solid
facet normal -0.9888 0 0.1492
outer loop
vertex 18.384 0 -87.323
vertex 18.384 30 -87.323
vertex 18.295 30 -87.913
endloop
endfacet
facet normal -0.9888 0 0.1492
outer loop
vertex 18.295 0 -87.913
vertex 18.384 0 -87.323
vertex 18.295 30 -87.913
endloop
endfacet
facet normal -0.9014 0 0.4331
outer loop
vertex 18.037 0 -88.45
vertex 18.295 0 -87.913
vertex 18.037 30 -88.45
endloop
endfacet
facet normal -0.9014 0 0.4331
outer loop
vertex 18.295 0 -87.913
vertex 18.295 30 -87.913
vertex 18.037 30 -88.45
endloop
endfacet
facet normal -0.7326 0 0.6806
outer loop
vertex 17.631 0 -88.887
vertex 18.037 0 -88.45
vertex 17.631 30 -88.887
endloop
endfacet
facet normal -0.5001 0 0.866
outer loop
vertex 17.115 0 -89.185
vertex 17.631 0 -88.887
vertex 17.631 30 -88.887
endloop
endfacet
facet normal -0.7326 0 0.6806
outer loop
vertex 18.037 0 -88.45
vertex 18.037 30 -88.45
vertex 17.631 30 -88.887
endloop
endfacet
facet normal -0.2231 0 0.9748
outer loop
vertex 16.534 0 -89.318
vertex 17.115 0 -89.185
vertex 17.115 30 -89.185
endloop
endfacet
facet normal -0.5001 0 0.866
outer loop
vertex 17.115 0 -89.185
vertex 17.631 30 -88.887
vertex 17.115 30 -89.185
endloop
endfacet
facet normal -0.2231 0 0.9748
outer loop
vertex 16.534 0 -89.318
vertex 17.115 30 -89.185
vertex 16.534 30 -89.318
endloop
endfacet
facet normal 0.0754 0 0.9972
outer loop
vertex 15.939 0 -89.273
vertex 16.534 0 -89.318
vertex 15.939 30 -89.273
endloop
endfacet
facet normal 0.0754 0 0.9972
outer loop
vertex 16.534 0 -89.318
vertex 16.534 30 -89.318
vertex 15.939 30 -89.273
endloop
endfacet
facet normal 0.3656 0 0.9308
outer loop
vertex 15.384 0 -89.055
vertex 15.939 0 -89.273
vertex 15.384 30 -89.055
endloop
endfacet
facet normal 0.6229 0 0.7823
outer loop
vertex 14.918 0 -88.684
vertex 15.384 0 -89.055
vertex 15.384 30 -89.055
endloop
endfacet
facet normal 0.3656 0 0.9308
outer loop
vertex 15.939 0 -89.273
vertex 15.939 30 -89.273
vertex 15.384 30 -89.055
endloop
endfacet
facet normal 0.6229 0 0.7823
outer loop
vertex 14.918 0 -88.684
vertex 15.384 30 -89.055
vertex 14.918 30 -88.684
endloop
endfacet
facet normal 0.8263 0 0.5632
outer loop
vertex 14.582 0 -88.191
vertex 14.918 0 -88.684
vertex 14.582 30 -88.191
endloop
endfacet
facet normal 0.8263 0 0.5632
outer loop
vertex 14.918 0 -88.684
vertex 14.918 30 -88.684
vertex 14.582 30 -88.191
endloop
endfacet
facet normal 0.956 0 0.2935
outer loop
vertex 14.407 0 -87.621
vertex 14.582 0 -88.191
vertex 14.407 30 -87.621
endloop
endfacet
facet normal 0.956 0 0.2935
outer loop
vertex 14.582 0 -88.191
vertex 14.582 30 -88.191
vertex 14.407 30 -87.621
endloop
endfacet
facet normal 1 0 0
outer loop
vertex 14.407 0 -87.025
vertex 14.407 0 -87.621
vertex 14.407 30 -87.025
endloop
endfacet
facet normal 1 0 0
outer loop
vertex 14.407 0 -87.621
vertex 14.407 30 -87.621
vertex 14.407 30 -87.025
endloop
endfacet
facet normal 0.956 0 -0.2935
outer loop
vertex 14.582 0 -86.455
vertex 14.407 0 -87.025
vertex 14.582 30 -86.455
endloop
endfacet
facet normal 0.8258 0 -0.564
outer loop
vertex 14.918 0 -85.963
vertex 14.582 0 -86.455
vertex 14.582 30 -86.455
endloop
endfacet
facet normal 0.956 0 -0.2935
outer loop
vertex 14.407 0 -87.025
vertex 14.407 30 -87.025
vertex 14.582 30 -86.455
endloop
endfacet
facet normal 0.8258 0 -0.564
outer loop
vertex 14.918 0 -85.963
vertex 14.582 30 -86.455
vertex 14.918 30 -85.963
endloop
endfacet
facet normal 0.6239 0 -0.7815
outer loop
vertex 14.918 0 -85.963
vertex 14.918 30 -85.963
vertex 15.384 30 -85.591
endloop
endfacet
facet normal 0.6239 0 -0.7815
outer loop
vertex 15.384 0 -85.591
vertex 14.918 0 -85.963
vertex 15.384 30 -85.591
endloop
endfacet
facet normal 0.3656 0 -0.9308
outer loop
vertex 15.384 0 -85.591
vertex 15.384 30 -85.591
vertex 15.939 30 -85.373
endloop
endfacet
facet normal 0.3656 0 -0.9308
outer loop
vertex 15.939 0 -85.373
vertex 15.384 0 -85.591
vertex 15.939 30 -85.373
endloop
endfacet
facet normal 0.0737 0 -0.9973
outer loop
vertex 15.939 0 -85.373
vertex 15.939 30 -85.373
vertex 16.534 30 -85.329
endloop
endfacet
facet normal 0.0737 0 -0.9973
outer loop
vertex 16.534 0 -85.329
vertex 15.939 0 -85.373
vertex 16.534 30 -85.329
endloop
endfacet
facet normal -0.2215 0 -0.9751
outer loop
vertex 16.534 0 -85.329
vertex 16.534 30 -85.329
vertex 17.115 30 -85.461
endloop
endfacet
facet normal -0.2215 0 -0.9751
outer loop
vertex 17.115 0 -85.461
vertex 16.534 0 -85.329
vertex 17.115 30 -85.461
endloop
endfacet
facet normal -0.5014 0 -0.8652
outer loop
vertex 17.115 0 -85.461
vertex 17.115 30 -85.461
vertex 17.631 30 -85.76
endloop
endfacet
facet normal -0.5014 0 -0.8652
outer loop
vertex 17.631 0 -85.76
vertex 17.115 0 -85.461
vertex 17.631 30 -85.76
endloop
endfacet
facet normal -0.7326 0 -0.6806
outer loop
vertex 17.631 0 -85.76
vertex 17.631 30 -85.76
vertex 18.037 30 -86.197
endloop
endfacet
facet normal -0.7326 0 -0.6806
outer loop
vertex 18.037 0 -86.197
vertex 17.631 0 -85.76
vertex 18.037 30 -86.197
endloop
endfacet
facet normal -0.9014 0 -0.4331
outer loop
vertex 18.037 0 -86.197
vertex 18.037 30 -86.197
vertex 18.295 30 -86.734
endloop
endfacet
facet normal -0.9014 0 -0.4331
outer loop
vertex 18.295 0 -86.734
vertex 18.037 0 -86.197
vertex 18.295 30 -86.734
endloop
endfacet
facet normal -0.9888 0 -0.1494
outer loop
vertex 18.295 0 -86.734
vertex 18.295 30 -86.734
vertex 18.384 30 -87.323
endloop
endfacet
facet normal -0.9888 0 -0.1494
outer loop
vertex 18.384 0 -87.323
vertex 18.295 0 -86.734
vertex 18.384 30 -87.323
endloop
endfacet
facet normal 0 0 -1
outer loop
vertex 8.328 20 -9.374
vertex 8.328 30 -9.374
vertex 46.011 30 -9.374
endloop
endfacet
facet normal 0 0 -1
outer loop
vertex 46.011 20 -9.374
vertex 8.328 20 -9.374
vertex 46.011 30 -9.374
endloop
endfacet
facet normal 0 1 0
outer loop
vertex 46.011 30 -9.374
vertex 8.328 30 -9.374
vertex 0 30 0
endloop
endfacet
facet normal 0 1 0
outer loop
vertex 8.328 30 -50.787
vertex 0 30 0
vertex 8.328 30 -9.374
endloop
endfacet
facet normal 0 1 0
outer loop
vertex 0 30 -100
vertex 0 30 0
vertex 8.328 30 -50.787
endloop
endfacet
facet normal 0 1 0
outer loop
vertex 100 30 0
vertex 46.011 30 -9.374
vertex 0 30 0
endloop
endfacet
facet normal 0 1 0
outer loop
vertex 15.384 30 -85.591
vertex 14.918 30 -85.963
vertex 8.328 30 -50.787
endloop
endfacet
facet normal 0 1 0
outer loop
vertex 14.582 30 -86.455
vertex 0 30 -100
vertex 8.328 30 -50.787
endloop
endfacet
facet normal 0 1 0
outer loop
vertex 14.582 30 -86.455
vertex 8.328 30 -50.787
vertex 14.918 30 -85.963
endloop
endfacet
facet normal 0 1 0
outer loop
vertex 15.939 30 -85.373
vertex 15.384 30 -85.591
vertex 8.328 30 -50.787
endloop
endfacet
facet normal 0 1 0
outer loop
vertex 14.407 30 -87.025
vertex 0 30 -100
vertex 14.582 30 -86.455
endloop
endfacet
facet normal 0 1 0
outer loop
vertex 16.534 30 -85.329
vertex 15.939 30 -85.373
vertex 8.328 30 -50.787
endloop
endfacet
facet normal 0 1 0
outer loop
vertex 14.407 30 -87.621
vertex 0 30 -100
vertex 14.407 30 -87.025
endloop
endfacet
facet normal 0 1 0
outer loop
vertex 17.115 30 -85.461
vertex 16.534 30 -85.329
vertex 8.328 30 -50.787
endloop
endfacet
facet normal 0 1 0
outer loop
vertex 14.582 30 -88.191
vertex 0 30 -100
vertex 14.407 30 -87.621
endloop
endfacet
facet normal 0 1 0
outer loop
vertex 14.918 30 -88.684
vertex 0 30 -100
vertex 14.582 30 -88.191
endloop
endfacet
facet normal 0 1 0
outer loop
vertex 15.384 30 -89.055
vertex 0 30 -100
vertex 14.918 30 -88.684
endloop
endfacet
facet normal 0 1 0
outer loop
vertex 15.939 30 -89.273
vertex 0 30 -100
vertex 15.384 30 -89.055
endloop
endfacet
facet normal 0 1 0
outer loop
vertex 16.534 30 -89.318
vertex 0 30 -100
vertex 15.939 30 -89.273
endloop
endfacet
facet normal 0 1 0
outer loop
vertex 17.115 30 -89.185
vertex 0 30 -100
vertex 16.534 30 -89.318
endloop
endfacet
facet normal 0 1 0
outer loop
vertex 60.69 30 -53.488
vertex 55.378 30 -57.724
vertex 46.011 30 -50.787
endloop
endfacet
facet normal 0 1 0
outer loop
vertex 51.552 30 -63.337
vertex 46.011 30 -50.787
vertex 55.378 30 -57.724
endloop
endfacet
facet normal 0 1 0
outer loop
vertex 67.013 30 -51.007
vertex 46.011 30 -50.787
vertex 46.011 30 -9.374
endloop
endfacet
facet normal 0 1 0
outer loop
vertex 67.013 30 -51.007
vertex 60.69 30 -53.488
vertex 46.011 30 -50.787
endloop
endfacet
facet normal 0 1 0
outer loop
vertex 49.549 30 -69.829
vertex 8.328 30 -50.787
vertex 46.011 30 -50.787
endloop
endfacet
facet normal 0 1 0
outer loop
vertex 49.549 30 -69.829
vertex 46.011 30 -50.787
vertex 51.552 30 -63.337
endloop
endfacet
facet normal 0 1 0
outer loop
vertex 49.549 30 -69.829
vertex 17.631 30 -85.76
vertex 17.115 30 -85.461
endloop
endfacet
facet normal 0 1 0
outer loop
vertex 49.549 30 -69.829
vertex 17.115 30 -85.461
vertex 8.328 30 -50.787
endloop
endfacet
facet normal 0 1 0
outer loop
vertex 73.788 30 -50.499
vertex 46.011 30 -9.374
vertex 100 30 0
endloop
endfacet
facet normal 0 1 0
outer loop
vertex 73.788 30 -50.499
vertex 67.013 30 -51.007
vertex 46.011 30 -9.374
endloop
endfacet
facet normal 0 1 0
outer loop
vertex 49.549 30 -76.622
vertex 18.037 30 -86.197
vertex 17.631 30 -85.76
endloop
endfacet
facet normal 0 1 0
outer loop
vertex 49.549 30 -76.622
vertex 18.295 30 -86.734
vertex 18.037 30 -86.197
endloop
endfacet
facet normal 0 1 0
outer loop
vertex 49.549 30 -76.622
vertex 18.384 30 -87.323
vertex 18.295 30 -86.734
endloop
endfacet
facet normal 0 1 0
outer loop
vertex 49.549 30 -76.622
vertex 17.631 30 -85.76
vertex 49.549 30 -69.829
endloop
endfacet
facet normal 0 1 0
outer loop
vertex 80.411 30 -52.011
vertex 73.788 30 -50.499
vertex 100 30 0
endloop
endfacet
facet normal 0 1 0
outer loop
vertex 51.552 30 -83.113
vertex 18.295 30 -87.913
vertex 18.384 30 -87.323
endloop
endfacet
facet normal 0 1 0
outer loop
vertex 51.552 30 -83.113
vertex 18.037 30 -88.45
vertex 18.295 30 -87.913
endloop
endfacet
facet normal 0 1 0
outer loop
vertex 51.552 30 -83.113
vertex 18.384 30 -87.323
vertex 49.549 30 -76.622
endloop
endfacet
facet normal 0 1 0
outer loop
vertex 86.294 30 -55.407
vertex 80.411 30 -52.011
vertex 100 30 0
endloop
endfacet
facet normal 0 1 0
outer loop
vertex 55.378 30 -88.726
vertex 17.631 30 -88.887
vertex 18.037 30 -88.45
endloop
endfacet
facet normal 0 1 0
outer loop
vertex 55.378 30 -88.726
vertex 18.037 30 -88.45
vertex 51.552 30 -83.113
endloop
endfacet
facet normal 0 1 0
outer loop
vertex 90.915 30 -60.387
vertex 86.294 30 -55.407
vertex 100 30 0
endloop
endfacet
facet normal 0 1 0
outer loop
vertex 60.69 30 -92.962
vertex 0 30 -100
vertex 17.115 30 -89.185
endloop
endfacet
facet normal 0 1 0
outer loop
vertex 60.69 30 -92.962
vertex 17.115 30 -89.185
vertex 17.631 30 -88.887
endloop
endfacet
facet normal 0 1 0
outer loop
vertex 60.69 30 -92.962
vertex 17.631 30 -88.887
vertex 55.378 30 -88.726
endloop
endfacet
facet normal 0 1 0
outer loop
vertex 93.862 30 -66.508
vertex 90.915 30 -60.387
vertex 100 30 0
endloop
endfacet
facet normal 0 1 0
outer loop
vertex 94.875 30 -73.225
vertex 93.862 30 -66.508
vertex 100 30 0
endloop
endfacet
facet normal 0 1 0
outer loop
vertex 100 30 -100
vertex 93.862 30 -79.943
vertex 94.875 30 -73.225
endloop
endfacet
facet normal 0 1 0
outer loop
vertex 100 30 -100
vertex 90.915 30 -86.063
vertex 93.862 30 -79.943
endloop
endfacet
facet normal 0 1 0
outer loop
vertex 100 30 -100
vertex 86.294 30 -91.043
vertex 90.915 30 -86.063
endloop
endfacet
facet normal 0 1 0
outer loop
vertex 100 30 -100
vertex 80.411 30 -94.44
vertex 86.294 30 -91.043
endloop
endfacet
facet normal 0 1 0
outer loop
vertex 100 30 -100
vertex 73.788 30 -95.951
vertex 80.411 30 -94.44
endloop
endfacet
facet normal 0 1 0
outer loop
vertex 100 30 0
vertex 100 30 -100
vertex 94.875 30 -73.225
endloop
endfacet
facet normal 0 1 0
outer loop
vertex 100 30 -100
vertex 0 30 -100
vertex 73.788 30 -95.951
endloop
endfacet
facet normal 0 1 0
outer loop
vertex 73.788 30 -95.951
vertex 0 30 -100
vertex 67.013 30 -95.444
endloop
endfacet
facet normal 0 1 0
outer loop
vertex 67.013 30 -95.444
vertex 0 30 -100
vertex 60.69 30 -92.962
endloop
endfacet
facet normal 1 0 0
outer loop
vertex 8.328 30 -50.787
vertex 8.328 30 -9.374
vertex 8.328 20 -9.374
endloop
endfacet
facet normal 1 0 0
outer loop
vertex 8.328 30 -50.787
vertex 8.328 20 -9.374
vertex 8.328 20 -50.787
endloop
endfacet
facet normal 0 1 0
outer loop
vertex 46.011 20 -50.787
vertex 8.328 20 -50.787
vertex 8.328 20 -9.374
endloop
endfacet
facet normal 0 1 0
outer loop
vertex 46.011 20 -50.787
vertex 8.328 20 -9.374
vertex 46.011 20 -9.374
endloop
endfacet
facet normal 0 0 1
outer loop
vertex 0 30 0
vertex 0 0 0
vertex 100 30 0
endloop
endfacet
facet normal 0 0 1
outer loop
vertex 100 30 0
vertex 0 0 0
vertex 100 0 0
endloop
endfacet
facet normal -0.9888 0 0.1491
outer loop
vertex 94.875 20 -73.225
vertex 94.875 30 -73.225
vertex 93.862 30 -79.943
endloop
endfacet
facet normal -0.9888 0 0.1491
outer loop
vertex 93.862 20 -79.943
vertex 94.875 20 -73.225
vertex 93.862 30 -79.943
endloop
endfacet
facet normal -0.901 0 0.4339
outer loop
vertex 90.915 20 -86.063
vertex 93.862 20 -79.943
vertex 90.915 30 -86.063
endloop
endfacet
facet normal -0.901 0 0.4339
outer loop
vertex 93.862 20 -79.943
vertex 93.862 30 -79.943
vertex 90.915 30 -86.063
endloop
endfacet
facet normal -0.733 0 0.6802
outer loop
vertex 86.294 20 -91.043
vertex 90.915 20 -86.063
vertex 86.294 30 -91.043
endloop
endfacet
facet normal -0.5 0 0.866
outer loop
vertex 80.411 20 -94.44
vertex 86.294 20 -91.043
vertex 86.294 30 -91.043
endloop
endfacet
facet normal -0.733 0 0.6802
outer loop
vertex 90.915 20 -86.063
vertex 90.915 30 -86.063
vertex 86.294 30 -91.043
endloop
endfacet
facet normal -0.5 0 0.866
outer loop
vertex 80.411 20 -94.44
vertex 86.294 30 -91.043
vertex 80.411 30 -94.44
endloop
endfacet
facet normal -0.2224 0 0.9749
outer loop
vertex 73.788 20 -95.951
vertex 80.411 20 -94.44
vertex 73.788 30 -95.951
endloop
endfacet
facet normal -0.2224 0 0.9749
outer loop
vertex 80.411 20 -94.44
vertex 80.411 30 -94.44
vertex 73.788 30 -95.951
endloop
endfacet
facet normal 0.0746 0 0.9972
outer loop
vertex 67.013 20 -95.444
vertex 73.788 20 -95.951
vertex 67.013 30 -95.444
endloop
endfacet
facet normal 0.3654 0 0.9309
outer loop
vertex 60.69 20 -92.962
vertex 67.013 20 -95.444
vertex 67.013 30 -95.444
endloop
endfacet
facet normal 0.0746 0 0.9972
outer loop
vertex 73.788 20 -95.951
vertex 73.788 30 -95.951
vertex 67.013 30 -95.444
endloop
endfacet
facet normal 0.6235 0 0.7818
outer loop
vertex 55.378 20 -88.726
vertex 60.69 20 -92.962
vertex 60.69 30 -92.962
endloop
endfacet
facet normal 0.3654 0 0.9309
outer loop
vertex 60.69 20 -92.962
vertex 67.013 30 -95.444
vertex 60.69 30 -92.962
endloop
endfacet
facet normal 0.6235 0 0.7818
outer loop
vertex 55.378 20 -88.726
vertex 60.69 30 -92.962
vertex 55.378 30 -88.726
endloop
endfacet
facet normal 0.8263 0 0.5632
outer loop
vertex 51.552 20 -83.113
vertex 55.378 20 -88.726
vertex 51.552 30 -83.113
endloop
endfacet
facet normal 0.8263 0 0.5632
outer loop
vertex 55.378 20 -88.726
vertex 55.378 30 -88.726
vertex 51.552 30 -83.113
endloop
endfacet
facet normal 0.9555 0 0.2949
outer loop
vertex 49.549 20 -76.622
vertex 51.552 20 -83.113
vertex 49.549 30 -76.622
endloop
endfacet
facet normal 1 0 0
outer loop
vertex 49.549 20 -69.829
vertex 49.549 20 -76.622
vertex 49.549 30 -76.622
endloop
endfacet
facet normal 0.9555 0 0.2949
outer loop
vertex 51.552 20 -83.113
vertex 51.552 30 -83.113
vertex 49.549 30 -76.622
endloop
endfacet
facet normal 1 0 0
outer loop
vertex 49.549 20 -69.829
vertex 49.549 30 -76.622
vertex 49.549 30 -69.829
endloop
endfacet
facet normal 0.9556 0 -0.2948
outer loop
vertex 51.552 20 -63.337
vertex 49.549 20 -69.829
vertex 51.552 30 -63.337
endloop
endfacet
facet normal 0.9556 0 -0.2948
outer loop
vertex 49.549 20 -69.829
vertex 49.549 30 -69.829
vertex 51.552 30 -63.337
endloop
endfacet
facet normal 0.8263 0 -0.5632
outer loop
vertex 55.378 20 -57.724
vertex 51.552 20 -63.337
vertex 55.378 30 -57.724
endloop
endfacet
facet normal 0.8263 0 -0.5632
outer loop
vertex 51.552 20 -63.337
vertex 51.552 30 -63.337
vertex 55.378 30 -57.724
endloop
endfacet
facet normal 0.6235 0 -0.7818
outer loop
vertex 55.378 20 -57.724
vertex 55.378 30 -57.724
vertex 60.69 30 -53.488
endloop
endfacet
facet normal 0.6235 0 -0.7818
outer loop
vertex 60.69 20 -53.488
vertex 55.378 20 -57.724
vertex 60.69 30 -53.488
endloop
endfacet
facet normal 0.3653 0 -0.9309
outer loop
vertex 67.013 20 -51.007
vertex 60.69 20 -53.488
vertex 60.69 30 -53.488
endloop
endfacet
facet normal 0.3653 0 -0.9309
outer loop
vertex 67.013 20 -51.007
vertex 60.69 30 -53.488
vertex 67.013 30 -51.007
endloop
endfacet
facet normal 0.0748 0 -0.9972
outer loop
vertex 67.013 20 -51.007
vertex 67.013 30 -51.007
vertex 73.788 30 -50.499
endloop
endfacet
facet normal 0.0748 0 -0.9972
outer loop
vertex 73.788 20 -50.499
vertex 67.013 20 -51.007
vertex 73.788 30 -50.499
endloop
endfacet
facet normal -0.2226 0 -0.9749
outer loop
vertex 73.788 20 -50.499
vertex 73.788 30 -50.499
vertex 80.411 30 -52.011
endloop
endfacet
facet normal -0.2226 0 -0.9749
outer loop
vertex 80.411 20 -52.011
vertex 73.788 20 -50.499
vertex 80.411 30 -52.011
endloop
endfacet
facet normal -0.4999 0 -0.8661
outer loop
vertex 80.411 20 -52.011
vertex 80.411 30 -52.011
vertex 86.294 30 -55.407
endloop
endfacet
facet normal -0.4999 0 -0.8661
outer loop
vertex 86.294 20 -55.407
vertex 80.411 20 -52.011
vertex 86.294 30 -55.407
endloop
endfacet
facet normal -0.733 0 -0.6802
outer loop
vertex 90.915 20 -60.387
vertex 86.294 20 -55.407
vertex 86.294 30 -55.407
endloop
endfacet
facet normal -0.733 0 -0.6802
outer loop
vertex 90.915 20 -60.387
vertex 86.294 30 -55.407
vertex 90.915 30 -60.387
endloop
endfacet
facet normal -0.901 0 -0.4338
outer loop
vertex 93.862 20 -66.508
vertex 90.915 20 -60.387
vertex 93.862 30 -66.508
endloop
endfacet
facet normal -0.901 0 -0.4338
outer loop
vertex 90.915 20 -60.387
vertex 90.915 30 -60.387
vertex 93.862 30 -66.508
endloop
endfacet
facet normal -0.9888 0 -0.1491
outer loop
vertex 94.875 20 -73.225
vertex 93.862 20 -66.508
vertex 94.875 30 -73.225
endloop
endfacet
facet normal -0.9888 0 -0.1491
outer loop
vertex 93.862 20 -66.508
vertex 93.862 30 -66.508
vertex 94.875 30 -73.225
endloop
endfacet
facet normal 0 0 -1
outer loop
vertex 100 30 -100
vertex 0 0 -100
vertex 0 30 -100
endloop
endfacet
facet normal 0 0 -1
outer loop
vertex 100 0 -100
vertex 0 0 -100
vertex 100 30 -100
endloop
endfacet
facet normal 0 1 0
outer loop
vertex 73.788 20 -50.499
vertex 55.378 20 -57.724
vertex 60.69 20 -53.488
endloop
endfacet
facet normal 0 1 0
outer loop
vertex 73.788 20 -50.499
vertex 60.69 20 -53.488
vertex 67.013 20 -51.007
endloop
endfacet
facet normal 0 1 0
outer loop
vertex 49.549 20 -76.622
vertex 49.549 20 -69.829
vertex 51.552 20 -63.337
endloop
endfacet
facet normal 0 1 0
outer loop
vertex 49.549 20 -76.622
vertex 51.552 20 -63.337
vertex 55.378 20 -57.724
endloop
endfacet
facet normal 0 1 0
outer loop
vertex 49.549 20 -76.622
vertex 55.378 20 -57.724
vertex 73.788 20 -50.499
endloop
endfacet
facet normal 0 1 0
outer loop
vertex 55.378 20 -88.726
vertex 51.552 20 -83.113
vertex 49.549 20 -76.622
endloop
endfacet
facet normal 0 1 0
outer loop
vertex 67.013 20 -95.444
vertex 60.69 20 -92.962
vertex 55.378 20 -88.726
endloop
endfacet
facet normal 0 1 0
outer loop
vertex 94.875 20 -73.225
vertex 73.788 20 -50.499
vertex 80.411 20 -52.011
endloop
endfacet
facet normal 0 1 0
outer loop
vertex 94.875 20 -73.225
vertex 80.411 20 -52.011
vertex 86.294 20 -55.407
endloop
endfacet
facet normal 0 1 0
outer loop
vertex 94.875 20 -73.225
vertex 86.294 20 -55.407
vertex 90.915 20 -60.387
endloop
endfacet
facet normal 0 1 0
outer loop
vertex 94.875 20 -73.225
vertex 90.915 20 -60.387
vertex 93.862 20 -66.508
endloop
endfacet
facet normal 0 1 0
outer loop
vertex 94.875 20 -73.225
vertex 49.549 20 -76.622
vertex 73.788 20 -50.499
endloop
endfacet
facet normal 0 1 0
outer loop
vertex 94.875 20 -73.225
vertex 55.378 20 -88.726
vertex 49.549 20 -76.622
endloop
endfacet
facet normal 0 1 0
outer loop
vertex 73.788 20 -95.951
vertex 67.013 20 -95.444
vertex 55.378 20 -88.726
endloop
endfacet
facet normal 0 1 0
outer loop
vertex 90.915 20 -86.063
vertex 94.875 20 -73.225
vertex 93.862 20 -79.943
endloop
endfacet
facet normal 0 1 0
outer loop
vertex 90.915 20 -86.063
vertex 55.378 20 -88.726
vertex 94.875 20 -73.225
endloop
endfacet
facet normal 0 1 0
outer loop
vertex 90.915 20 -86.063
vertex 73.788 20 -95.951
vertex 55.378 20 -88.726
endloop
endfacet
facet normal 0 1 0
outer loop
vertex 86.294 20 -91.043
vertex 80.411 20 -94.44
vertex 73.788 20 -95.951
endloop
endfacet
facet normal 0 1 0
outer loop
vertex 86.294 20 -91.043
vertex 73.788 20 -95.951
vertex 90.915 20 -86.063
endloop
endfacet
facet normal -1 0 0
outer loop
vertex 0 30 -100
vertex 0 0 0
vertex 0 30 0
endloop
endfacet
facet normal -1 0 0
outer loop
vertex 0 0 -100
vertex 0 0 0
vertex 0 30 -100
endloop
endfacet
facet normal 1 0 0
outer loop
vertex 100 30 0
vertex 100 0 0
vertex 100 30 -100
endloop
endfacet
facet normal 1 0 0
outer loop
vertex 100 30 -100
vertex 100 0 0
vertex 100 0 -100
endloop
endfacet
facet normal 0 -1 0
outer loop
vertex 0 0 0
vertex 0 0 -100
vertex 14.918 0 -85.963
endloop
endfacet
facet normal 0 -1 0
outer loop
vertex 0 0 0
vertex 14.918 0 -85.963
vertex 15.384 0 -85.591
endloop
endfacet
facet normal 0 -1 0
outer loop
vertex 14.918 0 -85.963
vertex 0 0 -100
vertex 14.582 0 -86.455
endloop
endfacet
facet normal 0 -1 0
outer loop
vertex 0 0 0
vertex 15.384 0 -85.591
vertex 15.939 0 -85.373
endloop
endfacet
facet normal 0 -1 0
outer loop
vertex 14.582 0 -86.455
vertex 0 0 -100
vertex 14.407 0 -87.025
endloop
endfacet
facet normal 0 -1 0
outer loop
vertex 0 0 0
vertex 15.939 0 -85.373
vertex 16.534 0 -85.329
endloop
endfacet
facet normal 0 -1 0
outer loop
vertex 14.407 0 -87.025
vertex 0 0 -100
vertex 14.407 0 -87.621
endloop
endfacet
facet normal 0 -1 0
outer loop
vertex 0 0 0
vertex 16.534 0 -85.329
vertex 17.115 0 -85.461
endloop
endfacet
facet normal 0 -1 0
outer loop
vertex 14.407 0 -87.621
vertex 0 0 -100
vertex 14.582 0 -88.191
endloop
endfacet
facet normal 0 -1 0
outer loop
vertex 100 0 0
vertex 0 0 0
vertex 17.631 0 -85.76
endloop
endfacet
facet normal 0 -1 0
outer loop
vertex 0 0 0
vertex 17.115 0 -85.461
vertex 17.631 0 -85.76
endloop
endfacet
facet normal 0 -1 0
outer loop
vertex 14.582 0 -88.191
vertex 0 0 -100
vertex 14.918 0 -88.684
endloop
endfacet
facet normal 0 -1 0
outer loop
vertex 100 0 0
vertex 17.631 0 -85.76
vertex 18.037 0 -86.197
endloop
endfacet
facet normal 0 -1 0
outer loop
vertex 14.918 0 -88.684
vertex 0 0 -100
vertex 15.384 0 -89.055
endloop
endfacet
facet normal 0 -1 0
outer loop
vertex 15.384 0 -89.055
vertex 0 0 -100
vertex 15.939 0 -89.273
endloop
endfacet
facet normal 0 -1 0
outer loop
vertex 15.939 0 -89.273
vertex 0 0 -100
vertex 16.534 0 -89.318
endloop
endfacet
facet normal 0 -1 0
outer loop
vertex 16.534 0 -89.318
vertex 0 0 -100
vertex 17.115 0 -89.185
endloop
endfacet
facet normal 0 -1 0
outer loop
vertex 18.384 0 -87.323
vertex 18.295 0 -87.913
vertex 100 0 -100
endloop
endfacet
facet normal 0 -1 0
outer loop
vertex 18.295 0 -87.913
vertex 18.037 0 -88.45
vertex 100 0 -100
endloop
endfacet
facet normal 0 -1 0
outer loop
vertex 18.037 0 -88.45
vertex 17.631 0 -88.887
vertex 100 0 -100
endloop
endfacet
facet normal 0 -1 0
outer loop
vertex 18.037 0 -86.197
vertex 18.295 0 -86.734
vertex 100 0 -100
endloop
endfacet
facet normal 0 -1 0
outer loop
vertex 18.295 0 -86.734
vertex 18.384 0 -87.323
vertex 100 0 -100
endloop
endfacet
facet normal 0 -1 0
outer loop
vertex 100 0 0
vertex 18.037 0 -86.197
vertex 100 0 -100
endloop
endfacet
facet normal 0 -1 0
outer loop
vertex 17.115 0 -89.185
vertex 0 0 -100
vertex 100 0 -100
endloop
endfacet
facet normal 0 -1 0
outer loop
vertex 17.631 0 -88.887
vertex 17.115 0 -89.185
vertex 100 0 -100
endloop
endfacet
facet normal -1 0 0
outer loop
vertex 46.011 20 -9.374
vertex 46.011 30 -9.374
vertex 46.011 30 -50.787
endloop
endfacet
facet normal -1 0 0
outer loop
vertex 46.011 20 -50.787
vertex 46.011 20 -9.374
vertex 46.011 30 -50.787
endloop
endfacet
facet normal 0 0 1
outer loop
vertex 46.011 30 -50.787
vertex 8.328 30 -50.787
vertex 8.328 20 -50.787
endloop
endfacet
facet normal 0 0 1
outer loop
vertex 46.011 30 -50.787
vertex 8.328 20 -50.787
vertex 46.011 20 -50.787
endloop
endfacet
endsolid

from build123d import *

# Parameters (mm, degrees)
SKETCH1_W           = 100
SKETCH1_H           = 100
BOSS_EXTRUDE1_DEPTH = 30
SKETCH5_R           = 2
CUT_EXTRUDE1_DEPTH  = 31
SKETCH7_R           = 22.78996388
SKETCH7_W           = 37.683489423
SKETCH7_H           = 41.413312703
CUT_EXTRUDE2_DEPTH  = 10


with BuildPart() as part:
    # Sketch1 → Boss-Extrude1 (new body)
    with BuildSketch(Plane(origin=(0, 0, 0), x_dir=(1, 0, 0), z_dir=(0, 1, 0))):
        with Locations((50, 50)):
            Rectangle(SKETCH1_W, SKETCH1_H)
    extrude(amount=BOSS_EXTRUDE1_DEPTH)

    # Sketch5 → Cut-Extrude1 (cut, through all)
    with BuildSketch(Plane(origin=(0, 30, 0), x_dir=(1, 0, 0), z_dir=(0, 1, 0))):
        with Locations((16.384313545, 87.323198024)):
            Circle(SKETCH5_R)
    extrude(amount=-CUT_EXTRUDE1_DEPTH, mode=Mode.SUBTRACT)

    # Sketch7 → Cut-Extrude2 (cut)
    with BuildSketch(Plane(origin=(0, 30, 0), x_dir=(1, 0, 0), z_dir=(0, 1, 0))):
        with Locations((72.084640228, 73.225170758)):
            Circle(SKETCH7_R)
        with Locations((27.16963915, 30.080771209)):
            Rectangle(SKETCH7_W, SKETCH7_H)
    extrude(amount=-CUT_EXTRUDE2_DEPTH, mode=Mode.SUBTRACT)


solid = part.part
